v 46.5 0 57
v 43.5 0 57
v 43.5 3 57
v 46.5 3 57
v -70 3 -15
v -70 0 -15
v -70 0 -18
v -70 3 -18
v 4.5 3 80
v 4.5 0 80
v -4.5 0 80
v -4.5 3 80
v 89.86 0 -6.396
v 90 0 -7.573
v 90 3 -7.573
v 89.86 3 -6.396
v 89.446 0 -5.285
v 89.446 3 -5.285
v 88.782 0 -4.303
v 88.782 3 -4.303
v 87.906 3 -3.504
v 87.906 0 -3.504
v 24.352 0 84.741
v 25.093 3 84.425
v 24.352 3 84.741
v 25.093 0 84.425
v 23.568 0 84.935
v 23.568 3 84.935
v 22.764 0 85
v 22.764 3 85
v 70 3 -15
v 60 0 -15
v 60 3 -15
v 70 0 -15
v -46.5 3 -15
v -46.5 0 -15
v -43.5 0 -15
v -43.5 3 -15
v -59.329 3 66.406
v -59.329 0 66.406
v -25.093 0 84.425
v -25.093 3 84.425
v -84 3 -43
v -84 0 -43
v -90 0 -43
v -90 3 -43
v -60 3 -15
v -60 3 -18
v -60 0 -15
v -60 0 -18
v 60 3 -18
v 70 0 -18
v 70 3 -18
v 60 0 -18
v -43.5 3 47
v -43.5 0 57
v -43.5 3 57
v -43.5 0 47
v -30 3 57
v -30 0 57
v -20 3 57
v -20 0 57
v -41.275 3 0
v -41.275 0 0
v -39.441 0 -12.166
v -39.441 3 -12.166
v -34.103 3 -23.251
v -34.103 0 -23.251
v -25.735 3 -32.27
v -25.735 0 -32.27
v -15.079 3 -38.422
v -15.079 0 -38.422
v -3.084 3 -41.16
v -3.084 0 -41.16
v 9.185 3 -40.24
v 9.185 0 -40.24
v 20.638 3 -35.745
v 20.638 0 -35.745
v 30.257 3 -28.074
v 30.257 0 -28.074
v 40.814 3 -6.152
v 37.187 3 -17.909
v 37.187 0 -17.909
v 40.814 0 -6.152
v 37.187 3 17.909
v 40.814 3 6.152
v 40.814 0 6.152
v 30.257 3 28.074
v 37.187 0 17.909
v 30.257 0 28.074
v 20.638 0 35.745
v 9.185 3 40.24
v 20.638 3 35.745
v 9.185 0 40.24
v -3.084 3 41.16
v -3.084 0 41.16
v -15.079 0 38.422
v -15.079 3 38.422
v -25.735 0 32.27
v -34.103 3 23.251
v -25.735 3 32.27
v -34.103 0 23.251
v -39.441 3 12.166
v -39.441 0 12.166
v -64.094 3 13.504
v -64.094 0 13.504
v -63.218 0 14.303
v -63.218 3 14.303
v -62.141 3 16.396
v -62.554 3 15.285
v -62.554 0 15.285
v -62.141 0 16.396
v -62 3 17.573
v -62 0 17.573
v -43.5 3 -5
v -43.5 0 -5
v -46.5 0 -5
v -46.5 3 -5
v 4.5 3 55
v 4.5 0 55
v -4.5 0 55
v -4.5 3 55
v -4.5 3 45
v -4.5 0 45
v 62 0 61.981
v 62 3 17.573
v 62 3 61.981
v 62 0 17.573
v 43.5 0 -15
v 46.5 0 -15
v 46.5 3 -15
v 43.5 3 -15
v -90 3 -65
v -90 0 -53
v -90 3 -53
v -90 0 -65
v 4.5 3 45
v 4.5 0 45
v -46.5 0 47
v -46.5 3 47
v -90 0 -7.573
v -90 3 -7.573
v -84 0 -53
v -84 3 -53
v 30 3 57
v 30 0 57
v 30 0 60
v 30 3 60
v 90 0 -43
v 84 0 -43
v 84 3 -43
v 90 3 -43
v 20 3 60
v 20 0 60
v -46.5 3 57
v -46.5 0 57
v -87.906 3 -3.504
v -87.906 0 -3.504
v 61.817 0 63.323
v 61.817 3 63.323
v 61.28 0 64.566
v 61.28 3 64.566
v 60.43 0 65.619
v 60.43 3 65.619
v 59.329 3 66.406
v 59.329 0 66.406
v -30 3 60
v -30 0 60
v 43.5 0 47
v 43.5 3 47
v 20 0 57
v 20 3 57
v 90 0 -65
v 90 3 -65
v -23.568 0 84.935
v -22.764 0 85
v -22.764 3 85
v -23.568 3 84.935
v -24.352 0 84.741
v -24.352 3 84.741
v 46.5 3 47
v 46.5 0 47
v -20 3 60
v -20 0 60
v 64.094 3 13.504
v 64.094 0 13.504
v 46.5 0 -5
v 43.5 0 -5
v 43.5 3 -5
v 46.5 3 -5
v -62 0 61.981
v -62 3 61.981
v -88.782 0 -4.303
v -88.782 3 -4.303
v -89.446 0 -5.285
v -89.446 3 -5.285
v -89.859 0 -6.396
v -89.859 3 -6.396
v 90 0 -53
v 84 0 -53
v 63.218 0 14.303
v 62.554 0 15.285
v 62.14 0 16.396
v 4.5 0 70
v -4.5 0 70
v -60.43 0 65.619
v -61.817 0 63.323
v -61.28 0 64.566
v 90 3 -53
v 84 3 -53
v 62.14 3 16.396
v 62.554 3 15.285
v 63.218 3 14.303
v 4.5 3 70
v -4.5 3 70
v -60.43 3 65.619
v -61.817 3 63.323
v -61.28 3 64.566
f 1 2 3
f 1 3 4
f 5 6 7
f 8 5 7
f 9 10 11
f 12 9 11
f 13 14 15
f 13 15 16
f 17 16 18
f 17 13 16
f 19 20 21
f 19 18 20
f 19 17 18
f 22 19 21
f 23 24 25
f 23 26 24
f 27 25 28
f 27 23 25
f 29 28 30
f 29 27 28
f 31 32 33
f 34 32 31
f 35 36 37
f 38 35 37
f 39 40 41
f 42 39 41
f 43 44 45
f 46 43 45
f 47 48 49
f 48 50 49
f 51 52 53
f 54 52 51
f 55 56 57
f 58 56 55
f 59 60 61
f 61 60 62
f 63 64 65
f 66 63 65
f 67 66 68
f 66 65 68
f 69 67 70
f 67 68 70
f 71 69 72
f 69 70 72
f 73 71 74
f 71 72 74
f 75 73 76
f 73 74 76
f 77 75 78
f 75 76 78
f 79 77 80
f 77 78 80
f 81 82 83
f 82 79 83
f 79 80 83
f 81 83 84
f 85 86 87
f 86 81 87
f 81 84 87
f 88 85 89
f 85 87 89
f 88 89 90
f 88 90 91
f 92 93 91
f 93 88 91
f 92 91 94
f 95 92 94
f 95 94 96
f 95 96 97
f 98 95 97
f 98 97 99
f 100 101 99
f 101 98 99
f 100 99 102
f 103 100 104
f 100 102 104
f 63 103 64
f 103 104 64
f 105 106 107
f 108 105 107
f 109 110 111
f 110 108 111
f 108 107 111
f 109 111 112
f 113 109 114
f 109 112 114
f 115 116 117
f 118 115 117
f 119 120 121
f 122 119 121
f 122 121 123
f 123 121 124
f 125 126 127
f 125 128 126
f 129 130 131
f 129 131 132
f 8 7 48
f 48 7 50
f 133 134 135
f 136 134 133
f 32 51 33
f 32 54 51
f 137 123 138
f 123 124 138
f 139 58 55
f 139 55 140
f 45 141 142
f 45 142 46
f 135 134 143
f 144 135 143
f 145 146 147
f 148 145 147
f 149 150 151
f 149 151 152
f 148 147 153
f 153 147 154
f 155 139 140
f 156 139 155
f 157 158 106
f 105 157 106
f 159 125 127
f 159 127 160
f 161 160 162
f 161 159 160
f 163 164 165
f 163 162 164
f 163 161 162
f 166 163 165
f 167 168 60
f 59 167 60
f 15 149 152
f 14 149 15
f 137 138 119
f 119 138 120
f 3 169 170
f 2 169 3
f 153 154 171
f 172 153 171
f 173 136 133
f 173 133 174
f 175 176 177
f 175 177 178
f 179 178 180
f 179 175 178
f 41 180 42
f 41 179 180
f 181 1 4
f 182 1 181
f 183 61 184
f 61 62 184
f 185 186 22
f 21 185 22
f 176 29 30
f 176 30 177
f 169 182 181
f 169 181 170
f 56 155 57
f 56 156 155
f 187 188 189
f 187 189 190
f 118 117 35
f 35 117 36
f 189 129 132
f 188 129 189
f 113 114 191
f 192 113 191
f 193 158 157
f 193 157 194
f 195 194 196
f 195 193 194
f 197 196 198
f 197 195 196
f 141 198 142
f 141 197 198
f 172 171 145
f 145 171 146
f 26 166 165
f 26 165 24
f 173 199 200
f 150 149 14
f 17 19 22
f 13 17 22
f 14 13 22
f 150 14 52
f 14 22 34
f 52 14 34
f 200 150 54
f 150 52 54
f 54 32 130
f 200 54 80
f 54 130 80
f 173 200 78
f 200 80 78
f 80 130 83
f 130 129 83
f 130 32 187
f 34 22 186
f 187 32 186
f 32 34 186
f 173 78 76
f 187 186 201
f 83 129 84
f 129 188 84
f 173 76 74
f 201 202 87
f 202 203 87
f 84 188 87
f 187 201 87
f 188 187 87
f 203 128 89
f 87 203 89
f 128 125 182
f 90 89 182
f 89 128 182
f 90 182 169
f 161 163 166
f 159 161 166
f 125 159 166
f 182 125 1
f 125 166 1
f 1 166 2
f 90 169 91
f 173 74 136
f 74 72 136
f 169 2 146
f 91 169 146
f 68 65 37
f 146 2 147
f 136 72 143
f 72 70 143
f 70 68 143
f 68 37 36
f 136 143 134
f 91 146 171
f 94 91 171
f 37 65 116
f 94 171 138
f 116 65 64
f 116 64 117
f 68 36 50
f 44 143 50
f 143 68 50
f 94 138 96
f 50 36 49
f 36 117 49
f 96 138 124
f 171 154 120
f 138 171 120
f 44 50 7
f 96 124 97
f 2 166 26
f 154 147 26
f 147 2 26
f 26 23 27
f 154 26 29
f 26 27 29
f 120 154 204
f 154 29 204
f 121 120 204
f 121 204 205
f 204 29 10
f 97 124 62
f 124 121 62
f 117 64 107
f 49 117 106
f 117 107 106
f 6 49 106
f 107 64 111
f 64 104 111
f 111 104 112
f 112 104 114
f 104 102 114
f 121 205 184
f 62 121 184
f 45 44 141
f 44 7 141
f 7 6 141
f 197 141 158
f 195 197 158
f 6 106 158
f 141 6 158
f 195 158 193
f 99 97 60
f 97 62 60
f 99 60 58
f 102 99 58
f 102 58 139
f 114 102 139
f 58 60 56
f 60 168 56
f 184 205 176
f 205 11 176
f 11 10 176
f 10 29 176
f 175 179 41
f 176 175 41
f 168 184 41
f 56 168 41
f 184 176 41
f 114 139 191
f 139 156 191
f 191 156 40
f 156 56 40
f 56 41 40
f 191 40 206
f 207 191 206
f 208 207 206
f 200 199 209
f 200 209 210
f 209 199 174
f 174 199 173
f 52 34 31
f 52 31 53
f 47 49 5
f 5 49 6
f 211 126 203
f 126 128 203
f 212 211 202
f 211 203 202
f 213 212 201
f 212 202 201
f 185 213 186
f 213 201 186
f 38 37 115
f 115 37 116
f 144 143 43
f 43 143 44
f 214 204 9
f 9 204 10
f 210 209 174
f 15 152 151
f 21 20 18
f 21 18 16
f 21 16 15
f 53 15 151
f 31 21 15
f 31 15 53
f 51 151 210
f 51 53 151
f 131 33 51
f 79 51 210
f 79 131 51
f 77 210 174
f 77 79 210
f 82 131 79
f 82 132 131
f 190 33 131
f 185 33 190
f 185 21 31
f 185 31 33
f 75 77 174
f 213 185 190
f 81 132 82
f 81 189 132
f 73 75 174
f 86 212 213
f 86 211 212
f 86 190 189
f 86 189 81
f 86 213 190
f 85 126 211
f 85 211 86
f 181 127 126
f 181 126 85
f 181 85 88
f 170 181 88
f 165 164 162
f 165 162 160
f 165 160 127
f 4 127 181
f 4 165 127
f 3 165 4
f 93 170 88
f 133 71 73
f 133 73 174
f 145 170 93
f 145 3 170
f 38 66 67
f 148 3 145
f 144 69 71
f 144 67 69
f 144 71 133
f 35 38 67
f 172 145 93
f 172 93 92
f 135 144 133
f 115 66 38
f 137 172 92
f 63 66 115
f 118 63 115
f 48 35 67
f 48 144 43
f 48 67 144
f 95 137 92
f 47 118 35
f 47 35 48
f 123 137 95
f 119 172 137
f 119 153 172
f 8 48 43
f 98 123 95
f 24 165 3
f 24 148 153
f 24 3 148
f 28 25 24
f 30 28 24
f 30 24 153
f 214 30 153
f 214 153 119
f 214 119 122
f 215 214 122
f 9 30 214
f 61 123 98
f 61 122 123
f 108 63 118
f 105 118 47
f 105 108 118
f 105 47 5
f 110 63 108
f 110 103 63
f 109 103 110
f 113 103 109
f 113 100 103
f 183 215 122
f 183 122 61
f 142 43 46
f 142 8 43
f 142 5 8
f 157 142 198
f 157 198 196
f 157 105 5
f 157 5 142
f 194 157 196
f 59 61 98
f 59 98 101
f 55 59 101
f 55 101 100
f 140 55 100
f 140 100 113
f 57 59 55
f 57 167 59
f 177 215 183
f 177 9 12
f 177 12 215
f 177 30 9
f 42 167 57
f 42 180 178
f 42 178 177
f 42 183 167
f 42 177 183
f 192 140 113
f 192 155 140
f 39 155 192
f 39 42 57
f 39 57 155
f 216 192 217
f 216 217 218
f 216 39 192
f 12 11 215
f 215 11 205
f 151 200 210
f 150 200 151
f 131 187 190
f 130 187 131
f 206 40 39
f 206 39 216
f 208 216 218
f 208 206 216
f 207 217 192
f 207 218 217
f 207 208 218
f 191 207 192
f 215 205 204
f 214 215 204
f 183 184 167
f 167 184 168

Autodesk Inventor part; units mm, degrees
ref_plane "YZ Plane" through (0, 0, 0) normal (1, 0, 0) x (0, 1, 0)
ref_plane "XZ Plane" through (0, 0, 0) normal (0, 1, 0) x (-1, 0, 0)
ref_plane "XY Plane" through (0, 0, 0) normal (0, 0, 1) x (1, 0, 0)
sketch "Sketch2" plane through (0, 0, 0) normal (0, 1, 0) x (-1, 0, 0)
  line L0 (90, -53) -> (84, -53)
  line L1 (84, -53) -> (84, -43)
  line L2 (84, -43) -> (90, -43)
  line L3 (-90, -53) -> (-84, -53)
  line L4 (-84, -53) -> (-84, -43)
  line L5 (-84, -43) -> (-90, -43)
  line L6 (70, -18) -> (60, -18)
  line L7 (60, -18) -> (60, -15)
  line L8 (60, -15) -> (70, -15)
  line L9 (70, -15) -> (70, -18)
  line L10 (-70, -18) -> (-60, -18)
  line L11 (-60, -18) -> (-60, -15)
  line L12 (-60, -15) -> (-70, -15)
  line L13 (-70, -15) -> (-70, -18)
  circle A0 centre (0, 0) radius 41.275
  line L14 (46.5, -15) -> (43.5, -15)
  line L15 (43.5, -15) -> (43.5, -5)
  line L16 (43.5, -5) -> (46.5, -5)
  line L17 (46.5, -5) -> (46.5, -15)
  line L18 (-46.5, -15) -> (-43.5, -15)
  line L19 (-43.5, -15) -> (-43.5, -5)
  line L20 (-43.5, -5) -> (-46.5, -5)
  line L21 (-46.5, -5) -> (-46.5, -15)
  line L22 (43.5, 57) -> (43.5, 47)
  line L23 (43.5, 47) -> (46.5, 47)
  line L24 (46.5, 47) -> (46.5, 57)
  line L25 (-46.5, 47) -> (-43.5, 47)
  line L26 (-43.5, 47) -> (-43.5, 57)
  line L27 (-46.5, 57) -> (-46.5, 47)
  line L28 (-22.7645, 85) -> (22.7645, 85)
  line L29 (46.5, 57) -> (43.5, 57)
  line L30 (-43.5, 57) -> (-46.5, 57)
  line L31 (30, 57) -> (20, 57)
  line L32 (20, 57) -> (20, 60)
  line L33 (20, 60) -> (30, 60)
  line L34 (30, 60) -> (30, 57)
  line L35 (-20, 57) -> (-30, 57)
  line L36 (-30, 57) -> (-30, 60)
  line L37 (-30, 60) -> (-20, 60)
  line L38 (-20, 60) -> (-20, 57)
  line L39 (4.5, 70) -> (-4.5, 70)
  line L40 (-4.5, 70) -> (-4.5, 80)
  line L41 (-4.5, 80) -> (4.5, 80)
  line L42 (4.5, 80) -> (4.5, 70)
  line L43 (4.5, 45) -> (-4.5, 45)
  line L44 (-4.5, 45) -> (-4.5, 55)
  line L45 (-4.5, 55) -> (4.5, 55)
  line L46 (4.5, 55) -> (4.5, 45)
  line L47 (-90, -43) -> (-90, -7.5731)
  line L48 (90, -7.5731) -> (90, -43)
  line L49 (90, -53) -> (90, -65)
  line L50 (-90, -53) -> (-90, -65)
  line L51 (90, -65) -> (-90, -65)
  line L52 (-62, 17.5731) -> (-62, 61.9813)
  line L53 (-59.3287, 66.4059) -> (-25.0933, 84.4246)
  line L54 (-64.0938, 13.5044) -> (-87.9062, -3.5044)
  line L55 (87.9062, -3.5044) -> (64.0938, 13.5044)
  line L56 (62, 17.5731) -> (62, 61.9813)
  line L57 (59.3287, 66.4059) -> (25.0933, 84.4246)
  arc A1 (-87.9062, -3.5044) -> (-90, -7.5731) centre (-85, -7.5731) ccw
  arc A2 (-64.0938, 13.5044) -> (-62, 17.5731) centre (-67, 17.5731) ccw
  arc A3 (-59.3287, 66.4059) -> (-62, 61.9813) centre (-57, 61.9813) ccw
  arc A4 (-22.7645, 85) -> (-25.0933, 84.4246) centre (-22.7645, 80) ccw
  arc A5 (25.0933, 84.4246) -> (22.7645, 85) centre (22.7645, 80) ccw
  arc A6 (62, 61.9813) -> (59.3287, 66.4059) centre (57, 61.9813) ccw
  arc A7 (62, 17.5731) -> (64.0938, 13.5044) centre (67, 17.5731) ccw
  arc A8 (90, -7.5731) -> (87.9062, -3.5044) centre (85, -7.5731) ccw
  point P0 (-62, 15)
  point P1 (-62, 65)
  point P2 (0, 0)
  point P3 (-24, 85)
  point P4 (-90, -5)
  point P5 (62, 15)
  point P6 (62, 65)
  point P7 (90, -5)
  point P8 (24, 85)
  dimension "d21" = 6
  dimension "d22" = 10
  dimension "d25" = 6
  dimension "d26" = 10
  dimension "d31" = 3
  dimension "d32" = 10
  dimension "d35" = 3
  dimension "d36" = 10
  dimension "d39" = 25
  dimension "d40" = 25
  dimension "d43" = 82.55
  dimension "d52" = 3
  dimension "d53" = 10
  dimension "d54" = 10
  dimension "d55" = 3
  dimension "d58" = 10
  dimension "d59" = 3
  dimension "d62" = 3
  dimension "d65" = 180
  dimension "d90" = 90
  dimension "d91" = 90
  dimension "d103" = 10
  dimension "d104" = 10
  dimension "d108" = 3
  dimension "d109" = 10
  dimension "d110" = 20
  dimension "d111" = 3
  dimension "d112" = 10
  dimension "d113" = 20
  dimension "d114" = 5
  dimension "d115" = 10
  dimension "d116" = 9
  dimension "d117" = 4.5
  dimension "d118" = 10
  dimension "d119" = 9
  dimension "d120" = 15
  dimension "d121" = 4.5
  dimension "d127" = 180
  dimension "d128" = 150
  dimension "d130" = 85.5
  dimension "d131" = 43.5
  dimension "d132" = 43.5
  dimension "d133" = 60
  dimension "d134" = 60
  dimension "d135" = 43.5
  dimension "d136" = 43.5
  dimension "d137" = 90
  dimension "d138" = 28
  dimension "d140" = 47
  dimension "d141" = 47
  dimension "d144" = 60
  dimension "d145" = 20
  dimension "d147" = 65
  dimension "d149" = 50
  dimension "d151" = 10
  dimension "d152" = 60
  dimension "d153" = 20
  dimension "d154" = 50
  dimension "d155" = 62
  dimension "d156" = 62
  dimension "d157" = 62
  dimension "d158" = 57
  dimension "d159" = 57
  dimension "d160" = 3
extrude "Extrusion6" add sketch "Sketch2" along normal blind 3
properties part number "Top Plate 25090213"
